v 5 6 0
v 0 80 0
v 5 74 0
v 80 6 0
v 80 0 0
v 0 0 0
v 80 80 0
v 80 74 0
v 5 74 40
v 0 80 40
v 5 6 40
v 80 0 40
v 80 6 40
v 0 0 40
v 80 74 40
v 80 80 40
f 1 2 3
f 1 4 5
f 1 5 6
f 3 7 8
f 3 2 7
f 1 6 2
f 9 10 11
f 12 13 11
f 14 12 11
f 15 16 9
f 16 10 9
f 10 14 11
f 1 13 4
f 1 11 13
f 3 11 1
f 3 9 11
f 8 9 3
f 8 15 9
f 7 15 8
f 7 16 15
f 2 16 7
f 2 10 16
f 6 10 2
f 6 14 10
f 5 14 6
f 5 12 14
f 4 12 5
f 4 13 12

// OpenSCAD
$fn = 32;

// ----------------------------------------------------------------------
// Structural section: channel 80 x 80 mm
// ----------------------------------------------------------------------

// --- parameters (mm) ---
sec_w = 80;               // channel width, X
sec_h = 80;               // channel height, Y
flange_t = 6;             // flange thickness
web_t = 5;                // web thickness
plate_t = 40;             // cut length, Z (extrusion height)

profile = [[0, 0], [80, 0], [80, 6], [5, 6], [5, 74], [80, 74], [80, 80], [0, 80]];  // primary outline, 8 points, counter clockwise

// --- the one profile operation ---
linear_extrude(height = plate_t) polygon(points = profile);
